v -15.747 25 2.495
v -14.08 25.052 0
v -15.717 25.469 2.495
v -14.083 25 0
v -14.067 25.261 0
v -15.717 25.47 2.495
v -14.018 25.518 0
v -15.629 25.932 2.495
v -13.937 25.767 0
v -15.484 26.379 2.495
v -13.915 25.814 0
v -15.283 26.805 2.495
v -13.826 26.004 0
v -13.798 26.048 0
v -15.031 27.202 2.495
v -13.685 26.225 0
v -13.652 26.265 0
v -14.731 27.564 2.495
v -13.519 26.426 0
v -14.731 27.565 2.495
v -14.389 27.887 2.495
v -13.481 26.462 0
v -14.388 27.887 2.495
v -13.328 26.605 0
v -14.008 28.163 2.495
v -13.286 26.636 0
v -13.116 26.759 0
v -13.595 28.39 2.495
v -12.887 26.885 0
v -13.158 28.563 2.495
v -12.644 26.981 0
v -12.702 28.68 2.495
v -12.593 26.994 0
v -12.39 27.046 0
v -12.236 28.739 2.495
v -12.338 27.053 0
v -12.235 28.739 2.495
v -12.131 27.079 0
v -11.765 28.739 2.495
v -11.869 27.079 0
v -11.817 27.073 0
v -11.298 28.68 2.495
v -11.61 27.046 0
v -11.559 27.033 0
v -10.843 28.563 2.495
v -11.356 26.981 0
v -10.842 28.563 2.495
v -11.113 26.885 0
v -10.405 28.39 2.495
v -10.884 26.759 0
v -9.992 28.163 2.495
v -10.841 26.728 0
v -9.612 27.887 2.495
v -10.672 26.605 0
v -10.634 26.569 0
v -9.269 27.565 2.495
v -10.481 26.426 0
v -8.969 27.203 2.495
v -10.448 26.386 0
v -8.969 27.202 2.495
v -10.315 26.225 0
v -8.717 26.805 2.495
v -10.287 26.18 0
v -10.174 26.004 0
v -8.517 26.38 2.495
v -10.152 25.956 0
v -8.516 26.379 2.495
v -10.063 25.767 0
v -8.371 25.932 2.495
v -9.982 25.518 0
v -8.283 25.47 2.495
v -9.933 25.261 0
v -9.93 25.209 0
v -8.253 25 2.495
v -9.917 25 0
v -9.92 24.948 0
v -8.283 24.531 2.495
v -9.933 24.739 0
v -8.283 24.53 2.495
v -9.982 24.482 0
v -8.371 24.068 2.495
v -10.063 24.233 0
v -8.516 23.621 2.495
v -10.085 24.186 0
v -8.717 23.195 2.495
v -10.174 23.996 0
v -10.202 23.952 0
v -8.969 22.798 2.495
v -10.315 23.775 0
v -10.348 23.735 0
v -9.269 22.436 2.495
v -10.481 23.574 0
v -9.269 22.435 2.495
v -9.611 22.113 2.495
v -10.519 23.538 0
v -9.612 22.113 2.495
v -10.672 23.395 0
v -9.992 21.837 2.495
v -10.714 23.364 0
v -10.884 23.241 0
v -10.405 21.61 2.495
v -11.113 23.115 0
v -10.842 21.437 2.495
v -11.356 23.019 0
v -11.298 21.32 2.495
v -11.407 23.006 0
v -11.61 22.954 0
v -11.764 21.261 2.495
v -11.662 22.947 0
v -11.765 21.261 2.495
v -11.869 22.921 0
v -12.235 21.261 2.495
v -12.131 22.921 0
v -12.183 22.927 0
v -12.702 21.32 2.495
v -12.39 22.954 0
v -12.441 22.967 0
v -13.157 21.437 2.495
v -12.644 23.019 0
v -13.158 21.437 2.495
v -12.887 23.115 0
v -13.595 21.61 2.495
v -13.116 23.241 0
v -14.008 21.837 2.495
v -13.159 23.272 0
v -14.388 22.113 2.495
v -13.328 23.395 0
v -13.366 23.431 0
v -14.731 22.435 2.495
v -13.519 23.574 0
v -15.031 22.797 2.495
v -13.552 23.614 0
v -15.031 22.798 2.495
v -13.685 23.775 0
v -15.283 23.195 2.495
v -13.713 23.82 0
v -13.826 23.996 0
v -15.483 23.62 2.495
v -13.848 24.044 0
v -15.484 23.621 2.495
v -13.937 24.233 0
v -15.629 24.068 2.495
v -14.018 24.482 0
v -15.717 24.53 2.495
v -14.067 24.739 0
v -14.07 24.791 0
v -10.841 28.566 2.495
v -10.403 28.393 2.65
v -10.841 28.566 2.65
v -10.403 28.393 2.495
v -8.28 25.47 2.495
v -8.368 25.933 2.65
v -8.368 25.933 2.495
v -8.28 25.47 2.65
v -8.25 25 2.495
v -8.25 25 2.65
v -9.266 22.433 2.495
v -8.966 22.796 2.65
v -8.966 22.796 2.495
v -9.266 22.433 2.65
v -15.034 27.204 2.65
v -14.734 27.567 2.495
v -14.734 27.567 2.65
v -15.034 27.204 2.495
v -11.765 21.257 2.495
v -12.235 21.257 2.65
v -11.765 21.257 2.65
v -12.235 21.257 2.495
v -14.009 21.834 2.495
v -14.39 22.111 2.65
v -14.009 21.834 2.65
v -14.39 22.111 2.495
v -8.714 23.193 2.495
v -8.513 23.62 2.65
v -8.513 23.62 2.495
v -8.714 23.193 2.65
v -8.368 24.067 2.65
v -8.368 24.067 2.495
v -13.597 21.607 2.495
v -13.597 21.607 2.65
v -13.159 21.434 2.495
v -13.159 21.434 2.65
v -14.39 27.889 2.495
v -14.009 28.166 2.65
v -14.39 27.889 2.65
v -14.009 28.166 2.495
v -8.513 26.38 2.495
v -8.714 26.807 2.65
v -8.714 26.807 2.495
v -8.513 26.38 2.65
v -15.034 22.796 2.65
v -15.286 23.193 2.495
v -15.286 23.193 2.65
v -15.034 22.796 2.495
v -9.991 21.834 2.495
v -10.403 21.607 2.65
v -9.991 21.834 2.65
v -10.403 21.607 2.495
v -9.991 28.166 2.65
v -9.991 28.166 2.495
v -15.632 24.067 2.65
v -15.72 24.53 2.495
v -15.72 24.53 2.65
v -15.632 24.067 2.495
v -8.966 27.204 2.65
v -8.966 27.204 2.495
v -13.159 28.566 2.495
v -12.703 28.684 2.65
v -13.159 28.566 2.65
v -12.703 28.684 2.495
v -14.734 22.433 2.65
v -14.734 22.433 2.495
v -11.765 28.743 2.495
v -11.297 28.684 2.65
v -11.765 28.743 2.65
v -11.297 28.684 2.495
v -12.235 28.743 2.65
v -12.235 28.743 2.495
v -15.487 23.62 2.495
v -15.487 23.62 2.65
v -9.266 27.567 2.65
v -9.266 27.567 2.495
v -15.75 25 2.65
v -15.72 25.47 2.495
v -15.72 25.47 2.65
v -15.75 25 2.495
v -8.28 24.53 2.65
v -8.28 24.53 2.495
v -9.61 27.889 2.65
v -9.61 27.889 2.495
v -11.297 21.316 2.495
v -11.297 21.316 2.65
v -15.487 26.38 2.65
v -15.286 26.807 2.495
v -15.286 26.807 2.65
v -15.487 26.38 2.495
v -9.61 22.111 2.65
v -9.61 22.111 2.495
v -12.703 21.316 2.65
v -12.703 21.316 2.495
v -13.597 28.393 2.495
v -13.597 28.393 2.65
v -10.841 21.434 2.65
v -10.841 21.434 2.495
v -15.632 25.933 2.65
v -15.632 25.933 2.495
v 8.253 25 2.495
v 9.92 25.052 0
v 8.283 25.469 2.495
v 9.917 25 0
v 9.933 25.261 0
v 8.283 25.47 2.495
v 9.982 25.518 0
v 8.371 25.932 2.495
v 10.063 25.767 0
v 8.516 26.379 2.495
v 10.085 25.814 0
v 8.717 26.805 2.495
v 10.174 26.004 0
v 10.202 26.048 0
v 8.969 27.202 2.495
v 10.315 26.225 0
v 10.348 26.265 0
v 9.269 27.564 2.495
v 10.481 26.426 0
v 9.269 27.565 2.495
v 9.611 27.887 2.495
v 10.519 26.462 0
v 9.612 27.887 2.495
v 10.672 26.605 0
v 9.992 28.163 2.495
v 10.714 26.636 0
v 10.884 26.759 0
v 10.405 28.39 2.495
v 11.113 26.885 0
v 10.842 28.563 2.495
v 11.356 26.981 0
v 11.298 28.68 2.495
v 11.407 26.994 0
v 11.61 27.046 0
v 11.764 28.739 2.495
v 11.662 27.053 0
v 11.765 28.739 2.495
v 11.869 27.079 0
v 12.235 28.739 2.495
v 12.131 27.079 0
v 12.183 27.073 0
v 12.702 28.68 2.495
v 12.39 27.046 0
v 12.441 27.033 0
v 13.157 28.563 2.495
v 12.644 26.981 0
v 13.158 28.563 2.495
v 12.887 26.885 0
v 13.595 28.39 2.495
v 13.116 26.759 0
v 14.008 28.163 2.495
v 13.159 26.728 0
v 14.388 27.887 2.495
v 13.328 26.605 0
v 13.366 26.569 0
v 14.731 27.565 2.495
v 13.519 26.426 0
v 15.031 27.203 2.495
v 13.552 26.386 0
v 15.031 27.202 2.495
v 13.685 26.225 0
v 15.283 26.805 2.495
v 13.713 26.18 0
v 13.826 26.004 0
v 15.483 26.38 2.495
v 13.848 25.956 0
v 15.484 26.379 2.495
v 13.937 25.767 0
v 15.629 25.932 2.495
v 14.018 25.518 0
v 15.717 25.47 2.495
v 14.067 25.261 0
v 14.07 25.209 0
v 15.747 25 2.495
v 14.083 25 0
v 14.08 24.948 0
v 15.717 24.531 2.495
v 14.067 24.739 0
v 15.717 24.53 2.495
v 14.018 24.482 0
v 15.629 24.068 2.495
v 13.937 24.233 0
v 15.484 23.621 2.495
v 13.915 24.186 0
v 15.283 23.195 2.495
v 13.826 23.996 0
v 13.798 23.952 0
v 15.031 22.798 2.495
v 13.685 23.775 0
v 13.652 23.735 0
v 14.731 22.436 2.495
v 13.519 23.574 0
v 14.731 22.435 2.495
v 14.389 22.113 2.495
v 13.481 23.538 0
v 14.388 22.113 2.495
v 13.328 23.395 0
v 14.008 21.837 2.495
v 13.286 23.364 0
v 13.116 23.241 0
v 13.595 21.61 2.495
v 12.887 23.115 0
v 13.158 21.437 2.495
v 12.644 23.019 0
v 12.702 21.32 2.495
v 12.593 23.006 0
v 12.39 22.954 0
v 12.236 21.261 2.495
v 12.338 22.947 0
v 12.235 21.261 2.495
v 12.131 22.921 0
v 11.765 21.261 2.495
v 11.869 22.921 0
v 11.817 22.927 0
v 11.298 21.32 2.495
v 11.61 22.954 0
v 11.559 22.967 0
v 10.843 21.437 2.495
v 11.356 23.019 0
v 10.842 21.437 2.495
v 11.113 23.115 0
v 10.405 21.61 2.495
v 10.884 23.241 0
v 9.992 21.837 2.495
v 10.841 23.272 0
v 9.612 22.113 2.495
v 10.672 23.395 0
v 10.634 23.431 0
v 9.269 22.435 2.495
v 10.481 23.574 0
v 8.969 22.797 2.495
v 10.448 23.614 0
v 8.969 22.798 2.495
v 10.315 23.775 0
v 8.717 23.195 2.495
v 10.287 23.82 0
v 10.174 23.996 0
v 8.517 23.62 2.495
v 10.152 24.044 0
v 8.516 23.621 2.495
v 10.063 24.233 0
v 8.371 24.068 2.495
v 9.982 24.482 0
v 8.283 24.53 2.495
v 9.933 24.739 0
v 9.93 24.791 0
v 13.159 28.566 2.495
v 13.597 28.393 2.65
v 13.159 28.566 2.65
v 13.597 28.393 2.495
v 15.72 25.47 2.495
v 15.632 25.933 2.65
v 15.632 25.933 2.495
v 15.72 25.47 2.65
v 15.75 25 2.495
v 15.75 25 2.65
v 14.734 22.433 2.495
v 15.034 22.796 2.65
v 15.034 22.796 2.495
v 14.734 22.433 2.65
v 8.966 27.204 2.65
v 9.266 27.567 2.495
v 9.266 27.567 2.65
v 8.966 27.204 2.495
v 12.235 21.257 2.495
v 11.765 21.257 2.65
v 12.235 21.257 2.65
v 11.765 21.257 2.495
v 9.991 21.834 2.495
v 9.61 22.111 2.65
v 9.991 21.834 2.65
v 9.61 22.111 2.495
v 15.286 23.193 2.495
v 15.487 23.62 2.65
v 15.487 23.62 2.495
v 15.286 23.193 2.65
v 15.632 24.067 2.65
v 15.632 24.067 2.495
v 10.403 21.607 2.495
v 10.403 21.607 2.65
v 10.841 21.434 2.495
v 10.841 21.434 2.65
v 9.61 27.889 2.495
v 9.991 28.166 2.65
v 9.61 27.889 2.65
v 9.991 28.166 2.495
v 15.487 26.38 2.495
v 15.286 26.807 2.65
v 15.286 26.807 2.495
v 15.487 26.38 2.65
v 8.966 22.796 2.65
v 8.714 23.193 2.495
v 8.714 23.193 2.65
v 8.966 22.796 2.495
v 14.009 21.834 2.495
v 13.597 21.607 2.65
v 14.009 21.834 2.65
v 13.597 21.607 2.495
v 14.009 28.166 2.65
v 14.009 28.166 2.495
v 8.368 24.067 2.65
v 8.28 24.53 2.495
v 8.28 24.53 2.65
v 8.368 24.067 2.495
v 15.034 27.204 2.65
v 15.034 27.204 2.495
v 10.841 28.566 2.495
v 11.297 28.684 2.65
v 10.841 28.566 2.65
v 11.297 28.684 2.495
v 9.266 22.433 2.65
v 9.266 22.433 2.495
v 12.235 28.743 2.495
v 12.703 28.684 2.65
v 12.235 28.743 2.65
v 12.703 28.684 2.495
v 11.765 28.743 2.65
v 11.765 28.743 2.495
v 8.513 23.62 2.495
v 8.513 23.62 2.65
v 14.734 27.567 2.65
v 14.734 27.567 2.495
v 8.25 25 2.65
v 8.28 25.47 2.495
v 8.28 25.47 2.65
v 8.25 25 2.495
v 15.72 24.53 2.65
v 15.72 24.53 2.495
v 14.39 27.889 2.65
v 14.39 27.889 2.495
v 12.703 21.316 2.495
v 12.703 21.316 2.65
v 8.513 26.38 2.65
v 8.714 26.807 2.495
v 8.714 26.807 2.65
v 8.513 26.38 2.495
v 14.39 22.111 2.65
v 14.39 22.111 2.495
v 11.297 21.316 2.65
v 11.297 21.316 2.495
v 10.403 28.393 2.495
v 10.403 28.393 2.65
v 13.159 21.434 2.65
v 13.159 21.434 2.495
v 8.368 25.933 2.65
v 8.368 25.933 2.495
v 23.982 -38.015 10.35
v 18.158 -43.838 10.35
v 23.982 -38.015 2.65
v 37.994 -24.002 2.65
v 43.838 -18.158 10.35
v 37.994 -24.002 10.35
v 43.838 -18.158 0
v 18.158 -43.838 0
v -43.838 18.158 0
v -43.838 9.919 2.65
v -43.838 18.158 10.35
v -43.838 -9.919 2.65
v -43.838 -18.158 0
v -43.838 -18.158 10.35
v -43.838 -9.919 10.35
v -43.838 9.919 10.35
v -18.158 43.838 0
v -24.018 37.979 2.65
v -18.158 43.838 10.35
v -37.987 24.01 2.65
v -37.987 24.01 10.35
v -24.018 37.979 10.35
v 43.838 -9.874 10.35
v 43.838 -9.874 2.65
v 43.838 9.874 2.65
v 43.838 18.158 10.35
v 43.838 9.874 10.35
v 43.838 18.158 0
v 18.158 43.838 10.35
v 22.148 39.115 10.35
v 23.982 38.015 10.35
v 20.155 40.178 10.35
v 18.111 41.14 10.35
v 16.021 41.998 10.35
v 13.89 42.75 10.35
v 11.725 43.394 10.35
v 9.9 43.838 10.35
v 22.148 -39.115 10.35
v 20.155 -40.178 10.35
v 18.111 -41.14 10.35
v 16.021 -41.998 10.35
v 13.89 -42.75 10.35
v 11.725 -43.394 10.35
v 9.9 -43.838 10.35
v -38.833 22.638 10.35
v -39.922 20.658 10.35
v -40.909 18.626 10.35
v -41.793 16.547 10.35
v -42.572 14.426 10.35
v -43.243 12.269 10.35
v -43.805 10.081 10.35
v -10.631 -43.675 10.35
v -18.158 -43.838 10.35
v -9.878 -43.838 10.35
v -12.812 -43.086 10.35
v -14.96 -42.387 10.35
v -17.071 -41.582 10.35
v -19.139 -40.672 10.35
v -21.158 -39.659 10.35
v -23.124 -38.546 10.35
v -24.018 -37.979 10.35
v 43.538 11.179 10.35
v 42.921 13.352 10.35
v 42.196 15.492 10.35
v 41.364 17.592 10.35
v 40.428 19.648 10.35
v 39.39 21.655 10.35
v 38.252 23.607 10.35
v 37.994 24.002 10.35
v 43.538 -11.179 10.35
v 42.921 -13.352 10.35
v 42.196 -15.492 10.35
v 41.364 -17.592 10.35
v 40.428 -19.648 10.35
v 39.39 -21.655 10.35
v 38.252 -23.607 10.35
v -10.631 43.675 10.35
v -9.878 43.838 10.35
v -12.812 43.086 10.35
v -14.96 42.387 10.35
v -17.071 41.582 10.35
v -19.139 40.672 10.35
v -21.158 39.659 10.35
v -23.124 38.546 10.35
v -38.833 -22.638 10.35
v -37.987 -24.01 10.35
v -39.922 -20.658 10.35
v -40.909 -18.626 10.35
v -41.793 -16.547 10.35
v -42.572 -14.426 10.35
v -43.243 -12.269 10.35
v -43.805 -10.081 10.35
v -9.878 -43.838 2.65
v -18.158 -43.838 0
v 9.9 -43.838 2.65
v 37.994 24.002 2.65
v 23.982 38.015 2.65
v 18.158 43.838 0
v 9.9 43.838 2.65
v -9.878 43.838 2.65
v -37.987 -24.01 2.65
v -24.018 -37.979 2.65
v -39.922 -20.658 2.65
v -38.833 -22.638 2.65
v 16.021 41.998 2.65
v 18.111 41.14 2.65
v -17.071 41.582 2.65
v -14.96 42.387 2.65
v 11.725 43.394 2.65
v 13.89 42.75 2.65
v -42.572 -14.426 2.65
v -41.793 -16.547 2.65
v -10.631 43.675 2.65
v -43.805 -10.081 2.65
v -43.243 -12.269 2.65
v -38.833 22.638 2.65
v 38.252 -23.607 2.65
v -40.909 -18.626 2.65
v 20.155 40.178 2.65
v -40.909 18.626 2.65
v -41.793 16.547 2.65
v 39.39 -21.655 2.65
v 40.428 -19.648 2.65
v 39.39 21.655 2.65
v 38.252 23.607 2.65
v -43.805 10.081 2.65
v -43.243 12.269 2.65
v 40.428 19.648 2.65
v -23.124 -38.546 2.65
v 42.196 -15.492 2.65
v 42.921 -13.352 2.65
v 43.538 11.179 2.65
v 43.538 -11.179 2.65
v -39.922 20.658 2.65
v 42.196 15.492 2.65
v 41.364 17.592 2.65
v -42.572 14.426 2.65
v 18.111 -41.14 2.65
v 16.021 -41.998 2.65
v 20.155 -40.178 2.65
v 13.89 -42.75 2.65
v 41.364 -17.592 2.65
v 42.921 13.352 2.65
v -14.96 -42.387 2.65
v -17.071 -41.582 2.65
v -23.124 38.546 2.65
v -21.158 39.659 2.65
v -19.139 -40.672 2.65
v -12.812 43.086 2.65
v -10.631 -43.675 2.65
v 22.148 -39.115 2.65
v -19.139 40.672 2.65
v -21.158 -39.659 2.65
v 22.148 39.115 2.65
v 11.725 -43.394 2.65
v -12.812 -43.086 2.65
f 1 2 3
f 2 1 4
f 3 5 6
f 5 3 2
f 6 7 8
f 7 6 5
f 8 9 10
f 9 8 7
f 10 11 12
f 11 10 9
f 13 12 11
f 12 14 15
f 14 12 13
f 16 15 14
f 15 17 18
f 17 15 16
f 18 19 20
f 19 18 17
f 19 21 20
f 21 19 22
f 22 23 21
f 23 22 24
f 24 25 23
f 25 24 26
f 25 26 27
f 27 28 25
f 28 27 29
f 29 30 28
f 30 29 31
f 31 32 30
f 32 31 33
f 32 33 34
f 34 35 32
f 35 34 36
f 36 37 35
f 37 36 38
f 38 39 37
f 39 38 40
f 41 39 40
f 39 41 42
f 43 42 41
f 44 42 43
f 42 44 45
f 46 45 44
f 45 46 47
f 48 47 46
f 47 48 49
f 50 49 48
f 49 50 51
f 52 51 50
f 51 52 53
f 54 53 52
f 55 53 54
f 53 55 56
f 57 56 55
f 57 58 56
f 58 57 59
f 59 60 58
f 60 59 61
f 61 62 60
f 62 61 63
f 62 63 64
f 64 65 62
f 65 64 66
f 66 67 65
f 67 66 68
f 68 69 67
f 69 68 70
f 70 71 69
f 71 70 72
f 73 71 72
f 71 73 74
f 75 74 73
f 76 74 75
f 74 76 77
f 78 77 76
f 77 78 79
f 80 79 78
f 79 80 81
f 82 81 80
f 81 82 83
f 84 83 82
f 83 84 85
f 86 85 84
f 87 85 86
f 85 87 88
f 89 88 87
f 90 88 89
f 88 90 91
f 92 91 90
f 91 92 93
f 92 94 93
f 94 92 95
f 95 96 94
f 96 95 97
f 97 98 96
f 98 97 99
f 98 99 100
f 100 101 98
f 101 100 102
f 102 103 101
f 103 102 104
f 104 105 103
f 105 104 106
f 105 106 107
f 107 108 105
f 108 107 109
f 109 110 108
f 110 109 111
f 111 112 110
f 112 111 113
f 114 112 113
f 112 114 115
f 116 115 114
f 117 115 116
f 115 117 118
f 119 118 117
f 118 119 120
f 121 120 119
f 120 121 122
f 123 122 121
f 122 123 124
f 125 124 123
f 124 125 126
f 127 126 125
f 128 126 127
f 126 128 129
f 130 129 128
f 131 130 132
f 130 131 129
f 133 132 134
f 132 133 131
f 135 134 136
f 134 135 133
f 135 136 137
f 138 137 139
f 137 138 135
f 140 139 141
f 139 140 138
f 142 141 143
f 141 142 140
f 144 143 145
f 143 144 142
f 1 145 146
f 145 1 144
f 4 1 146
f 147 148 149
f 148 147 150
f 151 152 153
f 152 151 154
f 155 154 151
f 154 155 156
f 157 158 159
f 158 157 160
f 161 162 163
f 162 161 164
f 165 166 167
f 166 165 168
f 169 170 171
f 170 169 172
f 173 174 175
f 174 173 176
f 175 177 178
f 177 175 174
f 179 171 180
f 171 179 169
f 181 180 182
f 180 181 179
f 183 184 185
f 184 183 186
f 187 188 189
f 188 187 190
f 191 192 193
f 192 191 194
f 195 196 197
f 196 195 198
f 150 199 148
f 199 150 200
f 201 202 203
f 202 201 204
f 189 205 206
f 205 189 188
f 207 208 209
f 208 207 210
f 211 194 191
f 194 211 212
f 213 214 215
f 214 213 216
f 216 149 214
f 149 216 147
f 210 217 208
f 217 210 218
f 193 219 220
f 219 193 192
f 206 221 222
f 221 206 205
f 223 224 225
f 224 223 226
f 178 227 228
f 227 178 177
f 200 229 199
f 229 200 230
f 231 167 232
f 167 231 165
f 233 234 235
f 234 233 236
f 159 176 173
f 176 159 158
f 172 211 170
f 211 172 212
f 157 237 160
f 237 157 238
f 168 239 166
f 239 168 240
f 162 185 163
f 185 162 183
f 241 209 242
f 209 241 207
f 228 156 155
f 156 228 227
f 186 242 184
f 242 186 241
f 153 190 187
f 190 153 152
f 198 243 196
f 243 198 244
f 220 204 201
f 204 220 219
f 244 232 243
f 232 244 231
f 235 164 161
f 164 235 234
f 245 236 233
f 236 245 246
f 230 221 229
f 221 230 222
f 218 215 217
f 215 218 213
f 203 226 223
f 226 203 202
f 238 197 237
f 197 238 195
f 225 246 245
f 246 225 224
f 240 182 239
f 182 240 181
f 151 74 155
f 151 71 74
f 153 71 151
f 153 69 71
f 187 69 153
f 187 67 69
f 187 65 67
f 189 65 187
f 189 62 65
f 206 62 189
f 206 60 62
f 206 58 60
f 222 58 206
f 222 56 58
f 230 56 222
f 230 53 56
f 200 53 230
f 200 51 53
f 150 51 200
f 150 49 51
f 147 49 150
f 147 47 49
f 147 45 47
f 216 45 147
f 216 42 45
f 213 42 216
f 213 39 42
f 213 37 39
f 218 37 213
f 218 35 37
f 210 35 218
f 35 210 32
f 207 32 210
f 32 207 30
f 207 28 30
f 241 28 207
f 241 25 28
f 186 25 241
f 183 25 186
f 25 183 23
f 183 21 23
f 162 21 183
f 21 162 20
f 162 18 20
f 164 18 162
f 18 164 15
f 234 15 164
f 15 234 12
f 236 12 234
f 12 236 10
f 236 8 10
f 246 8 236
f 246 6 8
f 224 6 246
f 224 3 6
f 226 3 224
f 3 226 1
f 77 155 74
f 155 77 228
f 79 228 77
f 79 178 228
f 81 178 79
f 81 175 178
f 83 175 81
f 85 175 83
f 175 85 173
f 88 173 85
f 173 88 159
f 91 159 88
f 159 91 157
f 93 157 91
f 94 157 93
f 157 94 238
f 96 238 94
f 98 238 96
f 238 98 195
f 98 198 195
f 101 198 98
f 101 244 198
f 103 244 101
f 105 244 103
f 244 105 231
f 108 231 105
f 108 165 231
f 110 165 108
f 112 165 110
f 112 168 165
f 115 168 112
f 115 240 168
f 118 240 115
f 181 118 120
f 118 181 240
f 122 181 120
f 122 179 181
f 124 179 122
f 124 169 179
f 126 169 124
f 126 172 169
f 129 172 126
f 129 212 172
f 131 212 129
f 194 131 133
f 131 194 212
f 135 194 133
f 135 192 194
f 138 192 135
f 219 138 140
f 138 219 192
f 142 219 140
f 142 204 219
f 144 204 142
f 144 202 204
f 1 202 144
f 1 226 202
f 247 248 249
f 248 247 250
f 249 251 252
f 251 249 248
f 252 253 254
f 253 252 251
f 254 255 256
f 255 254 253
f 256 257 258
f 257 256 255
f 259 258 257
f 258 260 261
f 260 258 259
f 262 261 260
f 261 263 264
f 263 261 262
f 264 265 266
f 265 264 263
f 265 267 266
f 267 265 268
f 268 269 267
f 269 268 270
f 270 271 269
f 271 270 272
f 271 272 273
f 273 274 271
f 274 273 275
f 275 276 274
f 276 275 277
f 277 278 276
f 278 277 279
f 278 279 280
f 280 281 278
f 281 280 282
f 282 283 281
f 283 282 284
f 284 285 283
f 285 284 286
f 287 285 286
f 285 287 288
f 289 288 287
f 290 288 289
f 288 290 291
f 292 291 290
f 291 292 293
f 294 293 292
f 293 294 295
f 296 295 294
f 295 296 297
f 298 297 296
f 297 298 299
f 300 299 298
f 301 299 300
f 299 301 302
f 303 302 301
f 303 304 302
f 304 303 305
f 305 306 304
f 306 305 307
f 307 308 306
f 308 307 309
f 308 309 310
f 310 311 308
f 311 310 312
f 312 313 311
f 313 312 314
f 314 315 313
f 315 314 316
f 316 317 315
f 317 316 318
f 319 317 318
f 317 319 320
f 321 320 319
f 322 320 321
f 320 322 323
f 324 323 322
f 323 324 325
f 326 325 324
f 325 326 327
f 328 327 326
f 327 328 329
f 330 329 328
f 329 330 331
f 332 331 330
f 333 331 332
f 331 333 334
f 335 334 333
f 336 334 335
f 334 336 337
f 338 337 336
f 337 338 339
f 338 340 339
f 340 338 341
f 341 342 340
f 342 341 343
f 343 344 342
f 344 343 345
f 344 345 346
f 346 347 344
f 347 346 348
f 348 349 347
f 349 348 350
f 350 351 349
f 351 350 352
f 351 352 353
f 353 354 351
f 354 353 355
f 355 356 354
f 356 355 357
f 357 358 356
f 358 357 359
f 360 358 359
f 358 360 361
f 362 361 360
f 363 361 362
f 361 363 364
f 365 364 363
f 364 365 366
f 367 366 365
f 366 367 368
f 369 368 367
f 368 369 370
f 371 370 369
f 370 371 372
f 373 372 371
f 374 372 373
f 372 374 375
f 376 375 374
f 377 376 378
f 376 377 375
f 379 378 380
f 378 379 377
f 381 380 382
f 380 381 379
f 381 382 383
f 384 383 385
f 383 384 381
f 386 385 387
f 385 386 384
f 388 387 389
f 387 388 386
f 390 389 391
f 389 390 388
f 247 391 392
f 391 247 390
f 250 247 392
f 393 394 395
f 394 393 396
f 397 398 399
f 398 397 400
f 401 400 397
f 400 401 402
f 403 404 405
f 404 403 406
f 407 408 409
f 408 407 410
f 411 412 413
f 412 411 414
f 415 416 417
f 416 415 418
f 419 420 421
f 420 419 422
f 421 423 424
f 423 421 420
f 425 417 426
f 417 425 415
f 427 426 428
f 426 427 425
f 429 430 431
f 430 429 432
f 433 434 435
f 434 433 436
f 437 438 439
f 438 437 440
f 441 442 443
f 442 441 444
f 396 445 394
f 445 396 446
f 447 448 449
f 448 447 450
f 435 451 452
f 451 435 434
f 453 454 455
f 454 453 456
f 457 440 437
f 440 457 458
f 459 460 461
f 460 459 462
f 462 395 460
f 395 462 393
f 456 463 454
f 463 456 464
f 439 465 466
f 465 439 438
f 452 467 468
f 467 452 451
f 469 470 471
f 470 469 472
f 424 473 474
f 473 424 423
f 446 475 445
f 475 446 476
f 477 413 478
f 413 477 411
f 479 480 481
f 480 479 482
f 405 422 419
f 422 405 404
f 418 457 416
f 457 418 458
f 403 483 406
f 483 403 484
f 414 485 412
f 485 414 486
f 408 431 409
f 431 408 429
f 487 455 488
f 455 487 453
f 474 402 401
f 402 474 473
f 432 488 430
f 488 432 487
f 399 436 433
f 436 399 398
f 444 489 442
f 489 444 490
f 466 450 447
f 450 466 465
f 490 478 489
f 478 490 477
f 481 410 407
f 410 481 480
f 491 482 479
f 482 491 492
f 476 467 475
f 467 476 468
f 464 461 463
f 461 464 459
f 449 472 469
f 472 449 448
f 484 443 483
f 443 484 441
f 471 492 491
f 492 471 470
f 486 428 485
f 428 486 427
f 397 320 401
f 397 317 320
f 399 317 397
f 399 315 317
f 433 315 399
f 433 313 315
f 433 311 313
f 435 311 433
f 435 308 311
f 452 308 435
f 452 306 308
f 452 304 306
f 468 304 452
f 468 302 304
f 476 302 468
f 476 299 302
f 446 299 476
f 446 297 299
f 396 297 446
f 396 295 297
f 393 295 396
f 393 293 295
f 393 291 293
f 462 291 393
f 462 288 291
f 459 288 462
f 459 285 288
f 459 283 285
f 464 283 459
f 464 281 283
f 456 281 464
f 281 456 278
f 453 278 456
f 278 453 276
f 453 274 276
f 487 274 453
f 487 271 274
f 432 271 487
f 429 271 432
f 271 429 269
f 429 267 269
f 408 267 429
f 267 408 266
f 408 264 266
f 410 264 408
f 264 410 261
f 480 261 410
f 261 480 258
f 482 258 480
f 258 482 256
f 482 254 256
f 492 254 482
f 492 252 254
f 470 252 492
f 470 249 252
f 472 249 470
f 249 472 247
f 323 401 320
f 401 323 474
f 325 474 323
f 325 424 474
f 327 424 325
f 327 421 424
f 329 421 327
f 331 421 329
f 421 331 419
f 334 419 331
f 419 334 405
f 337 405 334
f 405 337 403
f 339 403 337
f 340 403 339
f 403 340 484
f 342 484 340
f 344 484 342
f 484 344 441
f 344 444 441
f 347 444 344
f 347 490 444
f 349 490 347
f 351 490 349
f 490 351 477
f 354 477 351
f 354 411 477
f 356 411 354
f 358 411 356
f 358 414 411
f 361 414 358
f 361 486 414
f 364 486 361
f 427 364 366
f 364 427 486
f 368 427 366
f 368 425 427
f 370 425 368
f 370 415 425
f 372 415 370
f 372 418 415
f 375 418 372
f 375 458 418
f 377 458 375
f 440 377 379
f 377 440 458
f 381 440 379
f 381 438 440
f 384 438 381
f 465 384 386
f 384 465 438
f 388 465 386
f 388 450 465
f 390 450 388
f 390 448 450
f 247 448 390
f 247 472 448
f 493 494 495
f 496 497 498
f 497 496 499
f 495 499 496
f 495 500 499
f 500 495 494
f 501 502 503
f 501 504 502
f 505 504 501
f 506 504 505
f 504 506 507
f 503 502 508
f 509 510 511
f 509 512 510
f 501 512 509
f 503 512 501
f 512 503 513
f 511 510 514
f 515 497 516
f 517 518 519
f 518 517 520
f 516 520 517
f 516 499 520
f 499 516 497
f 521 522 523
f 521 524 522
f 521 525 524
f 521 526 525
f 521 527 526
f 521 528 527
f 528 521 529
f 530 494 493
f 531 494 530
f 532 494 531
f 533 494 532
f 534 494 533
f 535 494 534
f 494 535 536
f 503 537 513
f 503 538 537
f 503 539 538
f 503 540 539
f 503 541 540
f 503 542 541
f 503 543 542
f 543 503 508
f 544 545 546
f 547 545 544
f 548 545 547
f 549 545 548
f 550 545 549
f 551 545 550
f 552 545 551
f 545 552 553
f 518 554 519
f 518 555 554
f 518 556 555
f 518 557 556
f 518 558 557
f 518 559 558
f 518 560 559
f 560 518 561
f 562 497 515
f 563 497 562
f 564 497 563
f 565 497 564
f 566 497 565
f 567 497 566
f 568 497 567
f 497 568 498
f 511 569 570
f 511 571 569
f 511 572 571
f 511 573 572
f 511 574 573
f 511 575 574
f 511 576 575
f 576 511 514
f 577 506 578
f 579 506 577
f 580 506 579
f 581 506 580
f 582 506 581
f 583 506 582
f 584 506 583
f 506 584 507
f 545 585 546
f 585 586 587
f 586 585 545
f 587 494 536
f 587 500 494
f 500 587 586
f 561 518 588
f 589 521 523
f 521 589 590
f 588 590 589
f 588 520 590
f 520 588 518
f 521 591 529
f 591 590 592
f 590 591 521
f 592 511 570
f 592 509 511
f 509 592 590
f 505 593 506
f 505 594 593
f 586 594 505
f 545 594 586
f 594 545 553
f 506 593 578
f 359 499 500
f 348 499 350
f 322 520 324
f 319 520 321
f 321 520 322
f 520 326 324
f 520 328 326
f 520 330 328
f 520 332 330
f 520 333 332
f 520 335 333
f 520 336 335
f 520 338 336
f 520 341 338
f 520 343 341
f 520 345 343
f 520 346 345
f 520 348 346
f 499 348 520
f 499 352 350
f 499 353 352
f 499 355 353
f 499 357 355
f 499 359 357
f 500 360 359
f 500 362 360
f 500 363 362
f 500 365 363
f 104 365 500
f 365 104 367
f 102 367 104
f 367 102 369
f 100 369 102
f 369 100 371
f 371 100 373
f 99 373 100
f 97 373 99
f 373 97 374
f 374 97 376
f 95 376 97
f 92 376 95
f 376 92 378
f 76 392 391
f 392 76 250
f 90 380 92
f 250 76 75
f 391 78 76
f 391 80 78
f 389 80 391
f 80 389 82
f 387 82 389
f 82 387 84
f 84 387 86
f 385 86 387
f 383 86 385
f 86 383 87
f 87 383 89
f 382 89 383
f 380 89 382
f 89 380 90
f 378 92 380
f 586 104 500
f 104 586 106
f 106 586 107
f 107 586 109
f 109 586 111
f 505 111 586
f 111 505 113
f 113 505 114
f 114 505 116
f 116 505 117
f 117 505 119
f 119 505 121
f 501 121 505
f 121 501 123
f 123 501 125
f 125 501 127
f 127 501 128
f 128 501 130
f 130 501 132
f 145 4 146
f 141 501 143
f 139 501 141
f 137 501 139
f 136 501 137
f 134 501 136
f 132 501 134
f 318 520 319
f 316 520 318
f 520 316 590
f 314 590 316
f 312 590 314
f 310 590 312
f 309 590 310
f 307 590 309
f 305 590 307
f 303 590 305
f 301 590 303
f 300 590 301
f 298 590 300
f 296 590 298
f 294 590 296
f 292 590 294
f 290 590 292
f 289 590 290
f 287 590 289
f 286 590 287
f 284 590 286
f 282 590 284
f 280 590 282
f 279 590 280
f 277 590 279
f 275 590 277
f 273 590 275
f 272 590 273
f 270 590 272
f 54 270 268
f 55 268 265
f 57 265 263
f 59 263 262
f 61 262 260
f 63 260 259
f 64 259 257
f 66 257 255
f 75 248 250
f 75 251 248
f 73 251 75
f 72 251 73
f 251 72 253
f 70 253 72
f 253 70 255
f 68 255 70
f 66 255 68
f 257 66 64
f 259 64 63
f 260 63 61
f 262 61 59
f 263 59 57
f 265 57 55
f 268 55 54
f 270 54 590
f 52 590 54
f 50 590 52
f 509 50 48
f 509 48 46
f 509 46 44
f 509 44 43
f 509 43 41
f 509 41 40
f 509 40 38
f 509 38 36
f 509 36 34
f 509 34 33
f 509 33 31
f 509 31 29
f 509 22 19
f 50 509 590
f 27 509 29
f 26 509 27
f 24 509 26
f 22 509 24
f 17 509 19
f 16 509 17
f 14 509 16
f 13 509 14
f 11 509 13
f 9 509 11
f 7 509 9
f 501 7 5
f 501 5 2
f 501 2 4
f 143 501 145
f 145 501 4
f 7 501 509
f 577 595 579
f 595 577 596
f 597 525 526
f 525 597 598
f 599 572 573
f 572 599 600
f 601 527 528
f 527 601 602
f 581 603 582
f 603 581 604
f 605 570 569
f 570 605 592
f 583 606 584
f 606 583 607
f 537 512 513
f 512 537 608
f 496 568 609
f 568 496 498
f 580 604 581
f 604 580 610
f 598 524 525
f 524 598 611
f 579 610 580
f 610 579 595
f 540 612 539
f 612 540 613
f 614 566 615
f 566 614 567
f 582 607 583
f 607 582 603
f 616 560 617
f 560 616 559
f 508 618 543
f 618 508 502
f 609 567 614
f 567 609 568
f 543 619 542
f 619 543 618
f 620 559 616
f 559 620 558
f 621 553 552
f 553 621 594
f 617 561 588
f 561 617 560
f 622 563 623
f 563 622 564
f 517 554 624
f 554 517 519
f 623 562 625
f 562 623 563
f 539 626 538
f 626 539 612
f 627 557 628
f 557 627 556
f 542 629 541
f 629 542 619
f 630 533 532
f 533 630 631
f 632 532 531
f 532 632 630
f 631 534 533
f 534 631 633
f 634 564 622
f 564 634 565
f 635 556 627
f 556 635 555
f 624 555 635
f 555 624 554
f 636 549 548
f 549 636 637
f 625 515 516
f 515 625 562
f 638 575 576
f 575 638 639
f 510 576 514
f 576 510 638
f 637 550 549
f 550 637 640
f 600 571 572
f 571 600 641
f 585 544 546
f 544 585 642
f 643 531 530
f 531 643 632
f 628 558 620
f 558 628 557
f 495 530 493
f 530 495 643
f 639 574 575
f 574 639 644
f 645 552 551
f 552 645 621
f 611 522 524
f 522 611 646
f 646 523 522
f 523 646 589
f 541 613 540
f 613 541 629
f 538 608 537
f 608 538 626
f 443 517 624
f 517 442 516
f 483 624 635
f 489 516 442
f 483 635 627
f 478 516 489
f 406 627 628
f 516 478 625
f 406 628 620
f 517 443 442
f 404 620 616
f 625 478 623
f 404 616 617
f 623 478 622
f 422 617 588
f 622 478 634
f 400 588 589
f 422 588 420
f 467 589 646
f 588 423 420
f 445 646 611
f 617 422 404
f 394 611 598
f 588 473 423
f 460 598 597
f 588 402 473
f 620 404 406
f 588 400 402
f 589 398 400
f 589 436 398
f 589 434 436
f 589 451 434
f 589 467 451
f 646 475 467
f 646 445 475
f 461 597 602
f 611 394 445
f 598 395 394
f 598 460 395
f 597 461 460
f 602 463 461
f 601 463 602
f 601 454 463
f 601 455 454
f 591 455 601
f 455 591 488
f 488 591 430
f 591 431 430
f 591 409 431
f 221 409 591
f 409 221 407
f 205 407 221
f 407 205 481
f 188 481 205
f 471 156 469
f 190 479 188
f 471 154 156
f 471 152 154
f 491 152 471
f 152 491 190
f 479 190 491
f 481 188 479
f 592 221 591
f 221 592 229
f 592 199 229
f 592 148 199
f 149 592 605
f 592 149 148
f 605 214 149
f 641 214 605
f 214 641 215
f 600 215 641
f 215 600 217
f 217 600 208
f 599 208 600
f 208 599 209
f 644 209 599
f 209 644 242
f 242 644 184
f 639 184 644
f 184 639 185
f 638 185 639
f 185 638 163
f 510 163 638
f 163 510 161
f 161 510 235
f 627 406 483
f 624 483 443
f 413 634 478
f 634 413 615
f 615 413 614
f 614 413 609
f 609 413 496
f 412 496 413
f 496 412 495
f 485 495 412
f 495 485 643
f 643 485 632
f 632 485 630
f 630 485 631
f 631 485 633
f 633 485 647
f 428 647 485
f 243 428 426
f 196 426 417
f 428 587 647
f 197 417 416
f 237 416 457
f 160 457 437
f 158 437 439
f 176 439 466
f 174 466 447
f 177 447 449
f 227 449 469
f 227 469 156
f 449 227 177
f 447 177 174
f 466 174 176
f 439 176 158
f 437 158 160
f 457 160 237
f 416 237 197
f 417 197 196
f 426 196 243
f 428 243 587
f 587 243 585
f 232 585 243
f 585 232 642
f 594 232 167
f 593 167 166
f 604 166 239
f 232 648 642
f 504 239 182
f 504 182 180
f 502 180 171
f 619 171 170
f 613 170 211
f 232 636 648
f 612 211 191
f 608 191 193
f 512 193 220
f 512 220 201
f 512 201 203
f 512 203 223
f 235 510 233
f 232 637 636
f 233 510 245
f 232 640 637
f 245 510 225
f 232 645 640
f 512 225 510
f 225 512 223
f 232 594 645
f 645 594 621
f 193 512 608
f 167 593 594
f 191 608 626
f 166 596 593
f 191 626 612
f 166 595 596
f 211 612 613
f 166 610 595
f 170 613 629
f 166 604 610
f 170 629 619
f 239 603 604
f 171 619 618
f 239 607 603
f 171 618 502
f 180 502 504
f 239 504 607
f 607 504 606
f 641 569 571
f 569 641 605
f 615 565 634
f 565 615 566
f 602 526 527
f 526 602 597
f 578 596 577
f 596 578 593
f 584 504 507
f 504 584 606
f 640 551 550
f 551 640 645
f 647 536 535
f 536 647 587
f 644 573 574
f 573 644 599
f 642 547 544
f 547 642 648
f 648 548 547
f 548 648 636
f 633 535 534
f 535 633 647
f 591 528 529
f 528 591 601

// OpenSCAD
// file: Parts/Screw.scad
// created by IndiePandaaaaa | Lukas

$fn=50;

function cone_diameter(diameter)=diameter * 2;

function cone_diameter_cutout(diameter)=diameter * 2 + 0.5;

function cone_height(diameter)=diameter * 0.75;

module screw(diameter, length=12, cutout_sample=false) {
  module base_model(diameter, length, cone_height, cone_diameter, offset=0) {
    rotate_extrude() {
      polygon([
          [0, 0],
          [(diameter + offset) / 2, 0],
          [(diameter + offset) / 2, (length + offset) - (cone_height + offset)],
          [(cone_diameter + offset) / 2, length + offset],
          [0, length + offset],
        ]);
    }
  }

  if (length < diameter) {
    echo("Screw is too short");
    length=diameter + 5;
    echo("New length is: ", length);
  }

  if (!cutout_sample) {
    translate([0, 0, -length])
      difference() {
        base_model(diameter, length, cone_height(diameter), cone_diameter(diameter));

        // top cross part
        translate([0, 0, length - (cone_height(diameter) - diameter / 2) + .1])
          difference() {
            rotate([0, 0, 45])
              rotate_extrude() {
                polygon([
                    [0, 0],
                    [diameter * 1.4 / 2, 0],
                    [cone_diameter(diameter) / 3, cone_height(diameter) - diameter / 2],
                    [0, cone_height(diameter) - diameter / 2],
                  ]);
              }
            for (i=[0 : 1 : 3]) {
              rotate([0, 0, 90 * i])
                translate([diameter / 3.18 / 2, diameter / 3.18 / 2, 0]) cube(cone_height(diameter));
            }
          }
      }
  } else {
    offset=0;
    diameter=cone_diameter_cutout(diameter) / 2;  // is duplicated by function, used to reduce error
    translate([0, 0, -length - offset / 2]) {
      base_model(diameter, length, cone_height(diameter), cone_diameter(diameter), offset);
      translate([0, 0, length -.005]) cylinder(r=diameter, h=50);
    }
  }
}

module screw_corehole(diameter_screw, diameter_core, unthreaded_length, length=12) {
  union() {
    screw(diameter=diameter_screw, length=unthreaded_length, cutout_sample=true);
    translate([0, 0, -length]) cylinder(d=diameter_core, h=length - unthreaded_length + .1);
  }
}

module screw_with_nut(screw_length, diameter, square_channel=false, tolerance=.1) {
  function od(width) = ((width/2) / cos(30)) * 2; // calculates nut diameter from given width
  nut_thickness=[0.8, 1.6, 2.4, 3.2, 4, 5, 5.5, 6.5];
  nut_width=[2.5, 4, 5.5, 7.1, 8.1, 10.1, 11.1, 13.1];

  if (!(0 < diameter && diameter <= 8 && diameter == round(diameter))) {
    echo("module is only defined for integer values from M1 to M8.");
  } else {
    union() {
      if (!square_channel) {
        screw(diameter=diameter, length=screw_length, cutout_sample=true);

        translate([0, 0, -(screw_length*2 - nut_thickness[diameter - 1])]) 
          cylinder(d=od(nut_width[diameter - 1]) + tolerance, h=screw_length, $fn=6);

      } else {
        screw(diameter=diameter, length=screw_length + diameter, cutout_sample=true);
        translate([-od(nut_width[diameter - 1])/2 - tolerance, -(nut_width[diameter - 1]/2), -(screw_length)]) 
          cube([od(nut_width[diameter - 1]) + screw_length, nut_width[diameter - 1] + tolerance, nut_thickness[diameter - 1] + tolerance]);
      }
    }
  }
}

translate([ 0, 0, 0]) screw(diameter=3.5, length=12, cutout_sample=false);
translate([20, 0, 0]) screw_corehole(diameter_screw=3, diameter_core=2.5, unthreaded_length=15, length=20);
translate([40, 0, 0]) screw_with_nut(screw_length=30, diameter=4, square_channel=false, tolerance=.1);
// main file
// created by IndiePandaaaaa|Lukas
// encoding: utf-8

use <Parts/Screw.scad>

THICKNESS = 2.5;
TOLERANCE = .15;
$fn = $preview? 25:125;

PAD_HEIGHT = 8;
PAD_DIAMETER = 89.8 + .1;

module pad_mount() {
  edges = 8;
  difference() {
    rotate([0, 0, 90 + 360/edges/2]) cylinder(d=PAD_DIAMETER + THICKNESS*2, h=PAD_HEIGHT + THICKNESS - TOLERANCE, $fn=edges);
    translate([0, 0, THICKNESS + TOLERANCE]) cylinder(d=PAD_DIAMETER, h=PAD_HEIGHT);

    for (i=[0:1]) {
      translate([-12 + 24*i, 25, THICKNESS]) screw(3.5, 12, true);
    }
  }
}

pad_mount();
